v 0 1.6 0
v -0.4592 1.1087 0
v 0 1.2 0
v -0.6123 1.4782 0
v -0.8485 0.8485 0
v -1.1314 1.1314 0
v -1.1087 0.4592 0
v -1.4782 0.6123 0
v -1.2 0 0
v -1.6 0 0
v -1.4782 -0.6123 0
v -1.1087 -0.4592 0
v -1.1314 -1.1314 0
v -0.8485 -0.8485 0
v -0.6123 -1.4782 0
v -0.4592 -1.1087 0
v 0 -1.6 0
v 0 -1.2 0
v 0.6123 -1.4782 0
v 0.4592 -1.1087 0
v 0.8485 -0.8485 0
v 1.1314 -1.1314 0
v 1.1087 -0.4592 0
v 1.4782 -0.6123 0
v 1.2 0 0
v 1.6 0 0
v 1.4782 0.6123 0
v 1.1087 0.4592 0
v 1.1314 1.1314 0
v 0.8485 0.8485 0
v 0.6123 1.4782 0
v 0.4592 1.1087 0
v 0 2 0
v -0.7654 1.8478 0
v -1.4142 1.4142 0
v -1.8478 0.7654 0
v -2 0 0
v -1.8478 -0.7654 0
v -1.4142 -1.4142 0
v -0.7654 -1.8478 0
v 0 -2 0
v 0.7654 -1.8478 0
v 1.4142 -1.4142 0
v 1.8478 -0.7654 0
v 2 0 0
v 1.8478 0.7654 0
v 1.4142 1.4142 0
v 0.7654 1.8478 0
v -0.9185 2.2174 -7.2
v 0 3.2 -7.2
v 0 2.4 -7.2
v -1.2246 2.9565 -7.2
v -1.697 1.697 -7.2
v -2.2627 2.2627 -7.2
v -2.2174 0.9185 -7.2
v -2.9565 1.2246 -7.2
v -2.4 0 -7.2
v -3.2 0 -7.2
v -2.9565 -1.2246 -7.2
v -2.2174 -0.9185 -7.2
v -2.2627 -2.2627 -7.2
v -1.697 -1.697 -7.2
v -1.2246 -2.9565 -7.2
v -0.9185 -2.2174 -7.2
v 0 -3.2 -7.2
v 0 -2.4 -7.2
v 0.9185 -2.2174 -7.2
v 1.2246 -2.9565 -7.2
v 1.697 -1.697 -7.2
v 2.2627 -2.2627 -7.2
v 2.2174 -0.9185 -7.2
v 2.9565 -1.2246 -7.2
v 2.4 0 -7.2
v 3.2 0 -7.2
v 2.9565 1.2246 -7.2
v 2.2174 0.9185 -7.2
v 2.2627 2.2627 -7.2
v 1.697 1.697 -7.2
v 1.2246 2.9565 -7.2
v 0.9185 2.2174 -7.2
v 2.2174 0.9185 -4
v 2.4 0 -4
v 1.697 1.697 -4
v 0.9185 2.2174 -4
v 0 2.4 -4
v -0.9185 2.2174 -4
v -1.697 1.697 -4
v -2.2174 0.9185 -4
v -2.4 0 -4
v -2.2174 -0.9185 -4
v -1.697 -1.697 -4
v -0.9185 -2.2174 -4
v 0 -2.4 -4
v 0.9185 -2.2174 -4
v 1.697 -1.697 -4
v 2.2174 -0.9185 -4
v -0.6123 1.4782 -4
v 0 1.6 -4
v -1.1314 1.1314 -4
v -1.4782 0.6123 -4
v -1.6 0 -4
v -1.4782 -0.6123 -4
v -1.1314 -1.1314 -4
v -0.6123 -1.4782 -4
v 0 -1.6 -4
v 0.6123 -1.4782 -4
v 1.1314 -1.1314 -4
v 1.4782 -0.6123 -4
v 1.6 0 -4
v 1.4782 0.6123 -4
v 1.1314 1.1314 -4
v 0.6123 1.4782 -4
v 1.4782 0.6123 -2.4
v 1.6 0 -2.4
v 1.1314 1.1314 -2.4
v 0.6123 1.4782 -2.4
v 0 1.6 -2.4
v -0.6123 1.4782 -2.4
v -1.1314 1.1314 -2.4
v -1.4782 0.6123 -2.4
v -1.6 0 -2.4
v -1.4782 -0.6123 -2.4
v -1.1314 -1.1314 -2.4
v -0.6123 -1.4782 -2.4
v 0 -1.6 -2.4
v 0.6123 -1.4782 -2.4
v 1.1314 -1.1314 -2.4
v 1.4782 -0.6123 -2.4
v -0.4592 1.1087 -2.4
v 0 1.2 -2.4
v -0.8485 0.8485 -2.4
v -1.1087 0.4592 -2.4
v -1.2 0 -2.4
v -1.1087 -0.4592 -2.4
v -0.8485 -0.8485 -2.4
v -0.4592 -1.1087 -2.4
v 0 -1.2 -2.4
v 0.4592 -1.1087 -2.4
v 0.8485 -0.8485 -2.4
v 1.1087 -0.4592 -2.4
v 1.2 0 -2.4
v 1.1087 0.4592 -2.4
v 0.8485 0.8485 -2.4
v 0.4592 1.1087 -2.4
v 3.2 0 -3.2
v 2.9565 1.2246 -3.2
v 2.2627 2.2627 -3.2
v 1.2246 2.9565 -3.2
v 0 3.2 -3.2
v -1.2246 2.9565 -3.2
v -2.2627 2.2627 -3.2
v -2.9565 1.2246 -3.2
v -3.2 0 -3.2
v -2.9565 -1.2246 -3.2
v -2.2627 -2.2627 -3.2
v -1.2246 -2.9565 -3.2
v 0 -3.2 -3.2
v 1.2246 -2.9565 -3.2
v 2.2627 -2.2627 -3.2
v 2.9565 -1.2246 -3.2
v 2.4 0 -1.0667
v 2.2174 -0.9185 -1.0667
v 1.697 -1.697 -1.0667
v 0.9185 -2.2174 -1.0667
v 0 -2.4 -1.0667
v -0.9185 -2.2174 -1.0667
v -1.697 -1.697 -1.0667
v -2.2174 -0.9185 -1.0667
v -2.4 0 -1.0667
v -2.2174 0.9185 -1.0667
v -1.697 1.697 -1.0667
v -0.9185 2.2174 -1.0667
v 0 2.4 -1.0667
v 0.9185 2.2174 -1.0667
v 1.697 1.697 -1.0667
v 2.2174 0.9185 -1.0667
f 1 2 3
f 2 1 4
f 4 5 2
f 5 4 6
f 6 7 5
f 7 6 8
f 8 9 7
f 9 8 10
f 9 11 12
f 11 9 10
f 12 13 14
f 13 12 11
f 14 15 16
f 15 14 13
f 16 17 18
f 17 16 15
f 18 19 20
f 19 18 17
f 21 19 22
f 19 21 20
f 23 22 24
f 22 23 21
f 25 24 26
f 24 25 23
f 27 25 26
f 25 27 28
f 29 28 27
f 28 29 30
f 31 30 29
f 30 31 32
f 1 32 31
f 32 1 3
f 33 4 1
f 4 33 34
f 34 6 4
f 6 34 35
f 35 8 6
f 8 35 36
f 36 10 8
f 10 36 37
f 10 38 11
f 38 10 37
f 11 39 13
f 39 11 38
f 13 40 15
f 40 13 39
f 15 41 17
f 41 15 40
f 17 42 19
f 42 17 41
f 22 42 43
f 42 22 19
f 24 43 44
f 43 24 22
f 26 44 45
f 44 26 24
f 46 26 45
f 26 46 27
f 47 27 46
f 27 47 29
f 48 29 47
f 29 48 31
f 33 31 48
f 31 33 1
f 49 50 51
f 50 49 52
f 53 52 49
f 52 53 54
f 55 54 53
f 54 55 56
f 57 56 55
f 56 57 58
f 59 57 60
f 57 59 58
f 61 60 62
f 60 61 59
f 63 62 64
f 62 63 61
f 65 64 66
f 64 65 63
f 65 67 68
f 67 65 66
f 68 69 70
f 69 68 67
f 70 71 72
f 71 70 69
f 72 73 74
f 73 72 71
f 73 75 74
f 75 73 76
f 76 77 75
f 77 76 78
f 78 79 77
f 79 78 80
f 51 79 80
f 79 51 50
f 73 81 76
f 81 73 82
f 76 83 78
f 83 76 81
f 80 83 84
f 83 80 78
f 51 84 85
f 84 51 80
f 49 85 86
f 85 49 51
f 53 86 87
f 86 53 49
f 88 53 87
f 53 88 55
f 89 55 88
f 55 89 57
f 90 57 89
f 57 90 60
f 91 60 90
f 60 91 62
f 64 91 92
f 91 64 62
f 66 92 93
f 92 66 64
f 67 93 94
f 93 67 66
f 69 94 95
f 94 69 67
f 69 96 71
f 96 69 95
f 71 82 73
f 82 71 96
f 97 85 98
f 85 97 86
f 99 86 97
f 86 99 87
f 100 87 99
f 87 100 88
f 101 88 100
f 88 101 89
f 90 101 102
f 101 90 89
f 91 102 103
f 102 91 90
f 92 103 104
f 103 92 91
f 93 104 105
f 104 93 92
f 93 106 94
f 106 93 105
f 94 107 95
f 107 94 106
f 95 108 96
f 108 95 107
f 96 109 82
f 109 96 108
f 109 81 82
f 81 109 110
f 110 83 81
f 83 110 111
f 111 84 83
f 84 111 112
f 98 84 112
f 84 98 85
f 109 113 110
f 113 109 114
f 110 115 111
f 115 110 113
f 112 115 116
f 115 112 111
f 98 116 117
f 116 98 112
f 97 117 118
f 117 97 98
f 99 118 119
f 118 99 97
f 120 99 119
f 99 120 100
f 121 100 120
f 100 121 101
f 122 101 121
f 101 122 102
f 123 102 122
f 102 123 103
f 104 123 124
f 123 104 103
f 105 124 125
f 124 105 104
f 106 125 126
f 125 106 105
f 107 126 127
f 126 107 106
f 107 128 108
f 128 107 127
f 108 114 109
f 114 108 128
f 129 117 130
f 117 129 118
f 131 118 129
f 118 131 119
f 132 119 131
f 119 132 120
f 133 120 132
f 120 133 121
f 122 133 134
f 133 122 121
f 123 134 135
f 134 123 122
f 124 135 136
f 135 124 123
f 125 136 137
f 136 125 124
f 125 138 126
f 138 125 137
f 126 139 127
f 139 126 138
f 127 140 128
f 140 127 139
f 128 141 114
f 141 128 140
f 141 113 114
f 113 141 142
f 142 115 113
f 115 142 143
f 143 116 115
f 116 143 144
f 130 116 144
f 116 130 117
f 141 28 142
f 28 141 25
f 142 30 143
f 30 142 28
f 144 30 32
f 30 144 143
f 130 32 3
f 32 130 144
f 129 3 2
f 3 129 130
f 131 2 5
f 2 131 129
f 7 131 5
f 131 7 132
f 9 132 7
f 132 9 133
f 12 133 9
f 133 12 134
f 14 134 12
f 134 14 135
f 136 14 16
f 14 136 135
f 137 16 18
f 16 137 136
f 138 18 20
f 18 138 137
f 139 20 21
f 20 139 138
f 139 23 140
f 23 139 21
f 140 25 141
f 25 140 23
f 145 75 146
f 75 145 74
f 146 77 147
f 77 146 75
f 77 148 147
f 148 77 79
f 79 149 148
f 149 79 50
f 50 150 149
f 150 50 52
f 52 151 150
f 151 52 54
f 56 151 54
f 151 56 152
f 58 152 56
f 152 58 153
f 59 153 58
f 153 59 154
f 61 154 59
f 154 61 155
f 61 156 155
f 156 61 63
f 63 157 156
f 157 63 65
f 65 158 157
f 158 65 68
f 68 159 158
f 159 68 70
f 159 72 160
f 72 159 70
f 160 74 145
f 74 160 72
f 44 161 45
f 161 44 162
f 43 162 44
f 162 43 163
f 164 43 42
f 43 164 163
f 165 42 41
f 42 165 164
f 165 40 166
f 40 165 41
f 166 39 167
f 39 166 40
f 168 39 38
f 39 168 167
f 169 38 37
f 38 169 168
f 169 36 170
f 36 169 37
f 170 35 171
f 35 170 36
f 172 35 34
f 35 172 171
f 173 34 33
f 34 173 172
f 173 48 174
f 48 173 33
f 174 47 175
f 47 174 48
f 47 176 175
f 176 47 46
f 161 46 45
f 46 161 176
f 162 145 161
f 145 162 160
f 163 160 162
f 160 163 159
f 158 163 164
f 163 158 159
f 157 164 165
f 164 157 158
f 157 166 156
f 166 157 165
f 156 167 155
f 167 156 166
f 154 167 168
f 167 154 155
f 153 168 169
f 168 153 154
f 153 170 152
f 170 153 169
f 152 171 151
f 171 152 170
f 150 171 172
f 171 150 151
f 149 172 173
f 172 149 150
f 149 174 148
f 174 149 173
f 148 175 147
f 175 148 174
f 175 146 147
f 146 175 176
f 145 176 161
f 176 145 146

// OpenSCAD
// file: ../p/4-4cyli.scad
use <../lib.scad>
function ldraw_lib__4_4cyli() = [
// 0 Cylinder 1.0
// 0 Name: 4-4cyli.dat
// 0 Author: James Jessiman
// 0 !LDRAW_ORG Primitive UPDATE 2005-01
// 0 !LICENSE Licensed under CC BY 2.0 and CC BY 4.0 : see CAreadme.txt
// 
// 0 BFC CERTIFY CCW
  [0,"BFC","CERTIFY"],
  [0,"BFC","CCW"],
// 
// 0 !HISTORY 1998-12-15 [PTadmin] Official Update 1998-10
// 0 !HISTORY 2002-03-23 [sbliss] Added BFC statement; merged headers from files in distributions LDraw 0.27 and Complete.
// 0 !HISTORY 2002-04-25 [PTadmin] Official Update 2002-02
// 0 !HISTORY 2004-12-14 [guyvivan] BFC CCW
// 0 !HISTORY 2005-12-28 [PTadmin] Official Update 2005-01
// 0 !HISTORY 2007-06-24 [PTadmin] Header formatted for Contributor Agreement
// 0 !HISTORY 2008-07-01 [PTadmin] Official Update 2008-01
// 
// 
// 4 16 1 1 0 0.9239 1 0.3827 0.9239 0 0.3827 1 0 0
  [4,16,1,1,0,0.9239,1,0.3827,0.9239,0,0.3827,1,0,0],
// 5 24 1 0 0 1 1 0 0.9239 0 0.3827 0.9239 0 -0.3827
  [5,24,1,0,0,1,1,0,0.9239,0,0.3827,0.9239,0,-0.3827],
// 4 16 0.9239 1 0.3827 0.7071 1 0.7071 0.7071 0 0.7071 0.9239 0 0.3827
  [4,16,0.9239,1,0.3827,0.7071,1,0.7071,0.7071,0,0.7071,0.9239,0,0.3827],
// 5 24 0.9239 0 0.3827 0.9239 1 0.3827 0.7071 0 0.7071 1 0 0
  [5,24,0.9239,0,0.3827,0.9239,1,0.3827,0.7071,0,0.7071,1,0,0],
// 4 16 0.7071 1 0.7071 0.3827 1 0.9239 0.3827 0 0.9239 0.7071 0 0.7071
  [4,16,0.7071,1,0.7071,0.3827,1,0.9239,0.3827,0,0.9239,0.7071,0,0.7071],
// 5 24 0.7071 0 0.7071 0.7071 1 0.7071 0.3827 0 0.9239 0.9239 0 0.3827
  [5,24,0.7071,0,0.7071,0.7071,1,0.7071,0.3827,0,0.9239,0.9239,0,0.3827],
// 4 16 0.3827 1 0.9239 0 1 1 0 0 1 0.3827 0 0.9239
  [4,16,0.3827,1,0.9239,0,1,1,0,0,1,0.3827,0,0.9239],
// 5 24 0.3827 0 0.9239 0.3827 1 0.9239 0 0 1 0.7071 0 0.7071
  [5,24,0.3827,0,0.9239,0.3827,1,0.9239,0,0,1,0.7071,0,0.7071],
// 4 16 0 1 1 -0.3827 1 0.9239 -0.3827 0 0.9239 0 0 1
  [4,16,0,1,1,-0.3827,1,0.9239,-0.3827,0,0.9239,0,0,1],
// 5 24 0 0 1 0 1 1 -0.3827 0 0.9239 0.3827 0 0.9239
  [5,24,0,0,1,0,1,1,-0.3827,0,0.9239,0.3827,0,0.9239],
// 4 16 -0.3827 1 0.9239 -0.7071 1 0.7071 -0.7071 0 0.7071 -0.3827 0 0.9239
  [4,16,-0.3827,1,0.9239,-0.7071,1,0.7071,-0.7071,0,0.7071,-0.3827,0,0.9239],
// 5 24 -0.3827 0 0.9239 -0.3827 1 0.9239 -0.7071 0 0.7071 0 0 1
  [5,24,-0.3827,0,0.9239,-0.3827,1,0.9239,-0.7071,0,0.7071,0,0,1],
// 4 16 -0.7071 1 0.7071 -0.9239 1 0.3827 -0.9239 0 0.3827 -0.7071 0 0.7071
  [4,16,-0.7071,1,0.7071,-0.9239,1,0.3827,-0.9239,0,0.3827,-0.7071,0,0.7071],
// 5 24 -0.7071 0 0.7071 -0.7071 1 0.7071 -0.9239 0 0.3827 -0.3827 0 0.9239
  [5,24,-0.7071,0,0.7071,-0.7071,1,0.7071,-0.9239,0,0.3827,-0.3827,0,0.9239],
// 4 16 -0.9239 1 0.3827 -1 1 0 -1 0 0 -0.9239 0 0.3827
  [4,16,-0.9239,1,0.3827,-1,1,0,-1,0,0,-0.9239,0,0.3827],
// 5 24 -0.9239 0 0.3827 -0.9239 1 0.3827 -1 0 0 -0.7071 0 0.7071
  [5,24,-0.9239,0,0.3827,-0.9239,1,0.3827,-1,0,0,-0.7071,0,0.7071],
// 4 16 -1 1 0 -0.9239 1 -0.3827 -0.9239 0 -0.3827 -1 0 0
  [4,16,-1,1,0,-0.9239,1,-0.3827,-0.9239,0,-0.3827,-1,0,0],
// 5 24 -1 0 0 -1 1 0 -0.9239 0 -0.3827 -0.9239 0 0.3827
  [5,24,-1,0,0,-1,1,0,-0.9239,0,-0.3827,-0.9239,0,0.3827],
// 4 16 -0.9239 1 -0.3827 -0.7071 1 -0.7071 -0.7071 0 -0.7071 -0.9239 0 -0.3827
  [4,16,-0.9239,1,-0.3827,-0.7071,1,-0.7071,-0.7071,0,-0.7071,-0.9239,0,-0.3827],
// 5 24 -0.9239 0 -0.3827 -0.9239 1 -0.3827 -0.7071 0 -0.7071 -1 0 0
  [5,24,-0.9239,0,-0.3827,-0.9239,1,-0.3827,-0.7071,0,-0.7071,-1,0,0],
// 4 16 -0.7071 1 -0.7071 -0.3827 1 -0.9239 -0.3827 0 -0.9239 -0.7071 0 -0.7071
  [4,16,-0.7071,1,-0.7071,-0.3827,1,-0.9239,-0.3827,0,-0.9239,-0.7071,0,-0.7071],
// 5 24 -0.7071 0 -0.7071 -0.7071 1 -0.7071 -0.3827 0 -0.9239 -0.9239 0 -0.3827
  [5,24,-0.7071,0,-0.7071,-0.7071,1,-0.7071,-0.3827,0,-0.9239,-0.9239,0,-0.3827],
// 4 16 -0.3827 1 -0.9239 0 1 -1 0 0 -1 -0.3827 0 -0.9239
  [4,16,-0.3827,1,-0.9239,0,1,-1,0,0,-1,-0.3827,0,-0.9239],
// 5 24 -0.3827 0 -0.9239 -0.3827 1 -0.9239 0 0 -1 -0.7071 0 -0.7071
  [5,24,-0.3827,0,-0.9239,-0.3827,1,-0.9239,0,0,-1,-0.7071,0,-0.7071],
// 4 16 0 1 -1 0.3827 1 -0.9239 0.3827 0 -0.9239 0 0 -1
  [4,16,0,1,-1,0.3827,1,-0.9239,0.3827,0,-0.9239,0,0,-1],
// 5 24 0 0 -1 0 1 -1 0.3827 0 -0.9239 -0.3827 0 -0.9239
  [5,24,0,0,-1,0,1,-1,0.3827,0,-0.9239,-0.3827,0,-0.9239],
// 4 16 0.3827 1 -0.9239 0.7071 1 -0.7071 0.7071 0 -0.7071 0.3827 0 -0.9239
  [4,16,0.3827,1,-0.9239,0.7071,1,-0.7071,0.7071,0,-0.7071,0.3827,0,-0.9239],
// 5 24 0.3827 0 -0.9239 0.3827 1 -0.9239 0.7071 0 -0.7071 0 0 -1
  [5,24,0.3827,0,-0.9239,0.3827,1,-0.9239,0.7071,0,-0.7071,0,0,-1],
// 4 16 0.7071 1 -0.7071 0.9239 1 -0.3827 0.9239 0 -0.3827 0.7071 0 -0.7071
  [4,16,0.7071,1,-0.7071,0.9239,1,-0.3827,0.9239,0,-0.3827,0.7071,0,-0.7071],
// 5 24 0.7071 0 -0.7071 0.7071 1 -0.7071 0.9239 0 -0.3827 0.3827 0 -0.9239
  [5,24,0.7071,0,-0.7071,0.7071,1,-0.7071,0.9239,0,-0.3827,0.3827,0,-0.9239],
// 4 16 0.9239 1 -0.3827 1 1 0 1 0 0 0.9239 0 -0.3827
  [4,16,0.9239,1,-0.3827,1,1,0,1,0,0,0.9239,0,-0.3827],
// 5 24 0.9239 0 -0.3827 0.9239 1 -0.3827 1 0 0 0.7071 0 -0.7071
  [5,24,0.9239,0,-0.3827,0.9239,1,-0.3827,1,0,0,0.7071,0,-0.7071],
// 0
];
makepoly(ldraw_lib__4_4cyli(), line=0.2);
// file: ../p/4-4ring4.scad
use <../lib.scad>
function ldraw_lib__4_4ring4() = [
// 0 Ring  4 x 1.0
// 0 Name: 4-4ring4.dat
// 0 Author: James Jessiman
// 0 !LDRAW_ORG Primitive UPDATE 2009-01
// 0 !LICENSE Licensed under CC BY 2.0 and CC BY 4.0 : see CAreadme.txt
// 
// 0 BFC CERTIFY CCW
  [0,"BFC","CERTIFY"],
  [0,"BFC","CCW"],
// 
// 0 !HISTORY 1998-12-15 [PTadmin] Official Update 1998-10
// 0 !HISTORY 2002-04-08 [BrickCaster] Modified for BFC compliance
// 0 !HISTORY 2002-04-25 [PTadmin] Official Update 2002-02
// 0 !HISTORY 2007-06-24 [PTadmin] Header formatted for Contributor Agreement
// 0 !HISTORY 2008-07-01 [PTadmin] Official Update 2008-01
// 0 !HISTORY 2008-08-26 [cwdee] Switch polygon winding and rename
// 0 !HISTORY 2009-05-02 [PTadmin] Official Update 2009-01
// 
// 
// 4 16 -1.9135 0 4.6195 -1.5308 0 3.6956 0 0 4 0 0 5
  [4,16,-1.9135,0,4.6195,-1.5308,0,3.6956,0,0,4,0,0,5],
// 4 16 -3.5355 0 3.5355 -2.8284 0 2.8284 -1.5308 0 3.6956 -1.9135 0 4.6195
  [4,16,-3.5355,0,3.5355,-2.8284,0,2.8284,-1.5308,0,3.6956,-1.9135,0,4.6195],
// 4 16 -4.6195 0 1.9135 -3.6956 0 1.5308 -2.8284 0 2.8284 -3.5355 0 3.5355
  [4,16,-4.6195,0,1.9135,-3.6956,0,1.5308,-2.8284,0,2.8284,-3.5355,0,3.5355],
// 4 16 -5 0 0 -4 0 0 -3.6956 0 1.5308 -4.6195 0 1.9135
  [4,16,-5,0,0,-4,0,0,-3.6956,0,1.5308,-4.6195,0,1.9135],
// 4 16 -4.6195 0 -1.9135 -3.6956 0 -1.5308 -4 0 0 -5 0 0
  [4,16,-4.6195,0,-1.9135,-3.6956,0,-1.5308,-4,0,0,-5,0,0],
// 4 16 -3.5355 0 -3.5355 -2.8284 0 -2.8284 -3.6956 0 -1.5308 -4.6195 0 -1.9135
  [4,16,-3.5355,0,-3.5355,-2.8284,0,-2.8284,-3.6956,0,-1.5308,-4.6195,0,-1.9135],
// 4 16 -1.9135 0 -4.6195 -1.5308 0 -3.6956 -2.8284 0 -2.8284 -3.5355 0 -3.5355
  [4,16,-1.9135,0,-4.6195,-1.5308,0,-3.6956,-2.8284,0,-2.8284,-3.5355,0,-3.5355],
// 4 16 0 0 -5 0 0 -4 -1.5308 0 -3.6956 -1.9135 0 -4.6195
  [4,16,0,0,-5,0,0,-4,-1.5308,0,-3.6956,-1.9135,0,-4.6195],
// 4 16 1.9135 0 -4.6195 1.5308 0 -3.6956 0 0 -4 0 0 -5
  [4,16,1.9135,0,-4.6195,1.5308,0,-3.6956,0,0,-4,0,0,-5],
// 4 16 3.5355 0 -3.5355 2.8284 0 -2.8284 1.5308 0 -3.6956 1.9135 0 -4.6195
  [4,16,3.5355,0,-3.5355,2.8284,0,-2.8284,1.5308,0,-3.6956,1.9135,0,-4.6195],
// 4 16 4.6195 0 -1.9135 3.6956 0 -1.5308 2.8284 0 -2.8284 3.5355 0 -3.5355
  [4,16,4.6195,0,-1.9135,3.6956,0,-1.5308,2.8284,0,-2.8284,3.5355,0,-3.5355],
// 4 16 5 0 0 4 0 0 3.6956 0 -1.5308 4.6195 0 -1.9135
  [4,16,5,0,0,4,0,0,3.6956,0,-1.5308,4.6195,0,-1.9135],
// 4 16 4.6195 0 1.9135 3.6956 0 1.5308 4 0 0 5 0 0
  [4,16,4.6195,0,1.9135,3.6956,0,1.5308,4,0,0,5,0,0],
// 4 16 3.5355 0 3.5355 2.8284 0 2.8284 3.6956 0 1.5308 4.6195 0 1.9135
  [4,16,3.5355,0,3.5355,2.8284,0,2.8284,3.6956,0,1.5308,4.6195,0,1.9135],
// 4 16 1.9135 0 4.6195 1.5308 0 3.6956 2.8284 0 2.8284 3.5355 0 3.5355
  [4,16,1.9135,0,4.6195,1.5308,0,3.6956,2.8284,0,2.8284,3.5355,0,3.5355],
// 4 16 0 0 5 0 0 4 1.5308 0 3.6956 1.9135 0 4.6195
  [4,16,0,0,5,0,0,4,1.5308,0,3.6956,1.9135,0,4.6195],
// 0
];
makepoly(ldraw_lib__4_4ring4(), line=0.2);
// file: ../p/4-4ring3.scad
use <../lib.scad>
function ldraw_lib__4_4ring3() = [
// 0 Ring  3 x 1.0
// 0 Name: 4-4ring3.dat
// 0 Author: James Jessiman
// 0 !LDRAW_ORG Primitive UPDATE 2009-01
// 0 !LICENSE Licensed under CC BY 2.0 and CC BY 4.0 : see CAreadme.txt
// 
// 0 BFC CERTIFY CCW
  [0,"BFC","CERTIFY"],
  [0,"BFC","CCW"],
// 
// 0 !HISTORY 1998-12-15 [PTadmin] Official Update 1998-10
// 0 !HISTORY 2002-04-05 [hafhead] Added BFC statement
// 0 !HISTORY 2002-04-25 [PTadmin] Official Update 2002-02
// 0 !HISTORY 2007-06-24 [PTadmin] Header formatted for Contributor Agreement
// 0 !HISTORY 2008-07-01 [PTadmin] Official Update 2008-01
// 0 !HISTORY 2008-08-26 [cwdee] Switch polygon winding and rename
// 0 !HISTORY 2009-05-02 [PTadmin] Official Update 2009-01
// 
// 
// 4 16 -1.5308 0 3.6956 -1.1481 0 2.7717 0 0 3 0 0 4
  [4,16,-1.5308,0,3.6956,-1.1481,0,2.7717,0,0,3,0,0,4],
// 4 16 -2.8284 0 2.8284 -2.1213 0 2.1213 -1.1481 0 2.7717 -1.5308 0 3.6956
  [4,16,-2.8284,0,2.8284,-2.1213,0,2.1213,-1.1481,0,2.7717,-1.5308,0,3.6956],
// 4 16 -3.6956 0 1.5308 -2.7717 0 1.1481 -2.1213 0 2.1213 -2.8284 0 2.8284
  [4,16,-3.6956,0,1.5308,-2.7717,0,1.1481,-2.1213,0,2.1213,-2.8284,0,2.8284],
// 4 16 -4 0 0 -3 0 0 -2.7717 0 1.1481 -3.6956 0 1.5308
  [4,16,-4,0,0,-3,0,0,-2.7717,0,1.1481,-3.6956,0,1.5308],
// 4 16 -3.6956 0 -1.5308 -2.7717 0 -1.1481 -3 0 0 -4 0 0
  [4,16,-3.6956,0,-1.5308,-2.7717,0,-1.1481,-3,0,0,-4,0,0],
// 4 16 -2.8284 0 -2.8284 -2.1213 0 -2.1213 -2.7717 0 -1.1481 -3.6956 0 -1.5308
  [4,16,-2.8284,0,-2.8284,-2.1213,0,-2.1213,-2.7717,0,-1.1481,-3.6956,0,-1.5308],
// 4 16 -1.5308 0 -3.6956 -1.1481 0 -2.7717 -2.1213 0 -2.1213 -2.8284 0 -2.8284
  [4,16,-1.5308,0,-3.6956,-1.1481,0,-2.7717,-2.1213,0,-2.1213,-2.8284,0,-2.8284],
// 4 16 0 0 -4 0 0 -3 -1.1481 0 -2.7717 -1.5308 0 -3.6956
  [4,16,0,0,-4,0,0,-3,-1.1481,0,-2.7717,-1.5308,0,-3.6956],
// 4 16 1.5308 0 -3.6956 1.1481 0 -2.7717 0 0 -3 0 0 -4
  [4,16,1.5308,0,-3.6956,1.1481,0,-2.7717,0,0,-3,0,0,-4],
// 4 16 2.8284 0 -2.8284 2.1213 0 -2.1213 1.1481 0 -2.7717 1.5308 0 -3.6956
  [4,16,2.8284,0,-2.8284,2.1213,0,-2.1213,1.1481,0,-2.7717,1.5308,0,-3.6956],
// 4 16 3.6956 0 -1.5308 2.7717 0 -1.1481 2.1213 0 -2.1213 2.8284 0 -2.8284
  [4,16,3.6956,0,-1.5308,2.7717,0,-1.1481,2.1213,0,-2.1213,2.8284,0,-2.8284],
// 4 16 4 0 0 3 0 0 2.7717 0 -1.1481 3.6956 0 -1.5308
  [4,16,4,0,0,3,0,0,2.7717,0,-1.1481,3.6956,0,-1.5308],
// 4 16 3.6956 0 1.5308 2.7717 0 1.1481 3 0 0 4 0 0
  [4,16,3.6956,0,1.5308,2.7717,0,1.1481,3,0,0,4,0,0],
// 4 16 2.8284 0 2.8284 2.1213 0 2.1213 2.7717 0 1.1481 3.6956 0 1.5308
  [4,16,2.8284,0,2.8284,2.1213,0,2.1213,2.7717,0,1.1481,3.6956,0,1.5308],
// 4 16 1.5308 0 3.6956 1.1481 0 2.7717 2.1213 0 2.1213 2.8284 0 2.8284
  [4,16,1.5308,0,3.6956,1.1481,0,2.7717,2.1213,0,2.1213,2.8284,0,2.8284],
// 4 16 0 0 4 0 0 3 1.1481 0 2.7717 1.5308 0 3.6956
  [4,16,0,0,4,0,0,3,1.1481,0,2.7717,1.5308,0,3.6956],
// 0
];
makepoly(ldraw_lib__4_4ring3(), line=0.2);
// file: ../p/4-4ring2.scad
use <../lib.scad>
function ldraw_lib__4_4ring2() = [
// 0 Ring  2 x 1.0
// 0 Name: 4-4ring2.dat
// 0 Author: James Jessiman
// 0 !LDRAW_ORG Primitive UPDATE 2009-01
// 0 !LICENSE Licensed under CC BY 2.0 and CC BY 4.0 : see CAreadme.txt
// 
// 0 BFC CERTIFY CCW
  [0,"BFC","CERTIFY"],
  [0,"BFC","CCW"],
// 
// 0 !HISTORY 1998-12-15 [PTadmin] Official Update 1998-10
// 0 !HISTORY 2002-04-05 [hafhead] Added BFC statement
// 0 !HISTORY 2002-04-25 [PTadmin] Official Update 2002-02
// 0 !HISTORY 2007-06-24 [PTadmin] Header formatted for Contributor Agreement
// 0 !HISTORY 2008-07-01 [PTadmin] Official Update 2008-01
// 0 !HISTORY 2008-08-26 [cwdee] Switch polygon winding and rename
// 0 !HISTORY 2009-05-02 [PTadmin] Official Update 2009-01
// 
// 
// 4 16 -1.1481 0 2.7717 -0.7654 0 1.8478 0 0 2 0 0 3
  [4,16,-1.1481,0,2.7717,-0.7654,0,1.8478,0,0,2,0,0,3],
// 4 16 -2.1213 0 2.1213 -1.4142 0 1.4142 -0.7654 0 1.8478 -1.1481 0 2.7717
  [4,16,-2.1213,0,2.1213,-1.4142,0,1.4142,-0.7654,0,1.8478,-1.1481,0,2.7717],
// 4 16 -2.7717 0 1.1481 -1.8478 0 0.7654 -1.4142 0 1.4142 -2.1213 0 2.1213
  [4,16,-2.7717,0,1.1481,-1.8478,0,0.7654,-1.4142,0,1.4142,-2.1213,0,2.1213],
// 4 16 -3 0 0 -2 0 0 -1.8478 0 0.7654 -2.7717 0 1.1481
  [4,16,-3,0,0,-2,0,0,-1.8478,0,0.7654,-2.7717,0,1.1481],
// 4 16 -2.7717 0 -1.1481 -1.8478 0 -0.7654 -2 0 0 -3 0 0
  [4,16,-2.7717,0,-1.1481,-1.8478,0,-0.7654,-2,0,0,-3,0,0],
// 4 16 -2.1213 0 -2.1213 -1.4142 0 -1.4142 -1.8478 0 -0.7654 -2.7717 0 -1.1481
  [4,16,-2.1213,0,-2.1213,-1.4142,0,-1.4142,-1.8478,0,-0.7654,-2.7717,0,-1.1481],
// 4 16 -1.1481 0 -2.7717 -0.7654 0 -1.8478 -1.4142 0 -1.4142 -2.1213 0 -2.1213
  [4,16,-1.1481,0,-2.7717,-0.7654,0,-1.8478,-1.4142,0,-1.4142,-2.1213,0,-2.1213],
// 4 16 0 0 -3 0 0 -2 -0.7654 0 -1.8478 -1.1481 0 -2.7717
  [4,16,0,0,-3,0,0,-2,-0.7654,0,-1.8478,-1.1481,0,-2.7717],
// 4 16 1.1481 0 -2.7717 0.7654 0 -1.8478 0 0 -2 0 0 -3
  [4,16,1.1481,0,-2.7717,0.7654,0,-1.8478,0,0,-2,0,0,-3],
// 4 16 2.1213 0 -2.1213 1.4142 0 -1.4142 0.7654 0 -1.8478 1.1481 0 -2.7717
  [4,16,2.1213,0,-2.1213,1.4142,0,-1.4142,0.7654,0,-1.8478,1.1481,0,-2.7717],
// 4 16 2.7717 0 -1.1481 1.8478 0 -0.7654 1.4142 0 -1.4142 2.1213 0 -2.1213
  [4,16,2.7717,0,-1.1481,1.8478,0,-0.7654,1.4142,0,-1.4142,2.1213,0,-2.1213],
// 4 16 3 0 0 2 0 0 1.8478 0 -0.7654 2.7717 0 -1.1481
  [4,16,3,0,0,2,0,0,1.8478,0,-0.7654,2.7717,0,-1.1481],
// 4 16 2.7717 0 1.1481 1.8478 0 0.7654 2 0 0 3 0 0
  [4,16,2.7717,0,1.1481,1.8478,0,0.7654,2,0,0,3,0,0],
// 4 16 2.1213 0 2.1213 1.4142 0 1.4142 1.8478 0 0.7654 2.7717 0 1.1481
  [4,16,2.1213,0,2.1213,1.4142,0,1.4142,1.8478,0,0.7654,2.7717,0,1.1481],
// 4 16 1.1481 0 2.7717 0.7654 0 1.8478 1.4142 0 1.4142 2.1213 0 2.1213
  [4,16,1.1481,0,2.7717,0.7654,0,1.8478,1.4142,0,1.4142,2.1213,0,2.1213],
// 4 16 0 0 3 0 0 2 0.7654 0 1.8478 1.1481 0 2.7717
  [4,16,0,0,3,0,0,2,0.7654,0,1.8478,1.1481,0,2.7717],
// 0
];
makepoly(ldraw_lib__4_4ring2(), line=0.2);
// file: ../p/4-4edge.scad
use <../lib.scad>
function ldraw_lib__4_4edge() = [
// 0 Circle 1.0
// 0 Name: 4-4edge.dat
// 0 Author: James Jessiman
// 0 !LDRAW_ORG Primitive UPDATE 2017-01
// 0 !LICENSE Licensed under CC BY 2.0 and CC BY 4.0 : see CAreadme.txt
// 
// 0 BFC CERTIFY CCW
  [0,"BFC","CERTIFY"],
  [0,"BFC","CCW"],
// 
// 0 !HISTORY 1998-12-15 [PTadmin] Official Update 1998-10
// 0 !HISTORY 2005-12-28 [PTadmin] Official Update 2005-01
// 0 !HISTORY 2007-06-24 [PTadmin] Header formatted for Contributor Agreement
// 0 !HISTORY 2008-07-01 [PTadmin] Official Update 2008-01
// 0 !HISTORY 2017-01-15 [Steffen] BFCed
// 0 !HISTORY 2017-12-30 [PTadmin] Official Update 2017-01
// 
// 
// 2 24 1 0 0 0.9239 0 0.3827
  [2,24,1,0,0,0.9239,0,0.3827],
// 2 24 0.9239 0 0.3827 0.7071 0 0.7071
  [2,24,0.9239,0,0.3827,0.7071,0,0.7071],
// 2 24 0.7071 0 0.7071 0.3827 0 0.9239
  [2,24,0.7071,0,0.7071,0.3827,0,0.9239],
// 2 24 0.3827 0 0.9239 0 0 1
  [2,24,0.3827,0,0.9239,0,0,1],
// 2 24 0 0 1 -0.3827 0 0.9239
  [2,24,0,0,1,-0.3827,0,0.9239],
// 2 24 -0.3827 0 0.9239 -0.7071 0 0.7071
  [2,24,-0.3827,0,0.9239,-0.7071,0,0.7071],
// 2 24 -0.7071 0 0.7071 -0.9239 0 0.3827
  [2,24,-0.7071,0,0.7071,-0.9239,0,0.3827],
// 2 24 -0.9239 0 0.3827 -1 0 -0
  [2,24,-0.9239,0,0.3827,-1,0,-0],
// 2 24 -1 0 -0 -0.9239 0 -0.3827
  [2,24,-1,0,-0,-0.9239,0,-0.3827],
// 2 24 -0.9239 0 -0.3827 -0.7071 0 -0.7071
  [2,24,-0.9239,0,-0.3827,-0.7071,0,-0.7071],
// 2 24 -0.7071 0 -0.7071 -0.3827 0 -0.9239
  [2,24,-0.7071,0,-0.7071,-0.3827,0,-0.9239],
// 2 24 -0.3827 0 -0.9239 0 0 -1
  [2,24,-0.3827,0,-0.9239,0,0,-1],
// 2 24 0 0 -1 0.3827 0 -0.9239
  [2,24,0,0,-1,0.3827,0,-0.9239],
// 2 24 0.3827 0 -0.9239 0.7071 0 -0.7071
  [2,24,0.3827,0,-0.9239,0.7071,0,-0.7071],
// 2 24 0.7071 0 -0.7071 0.9239 0 -0.3827
  [2,24,0.7071,0,-0.7071,0.9239,0,-0.3827],
// 2 24 0.9239 0 -0.3827 1 0 0
  [2,24,0.9239,0,-0.3827,1,0,0],
];
makepoly(ldraw_lib__4_4edge(), line=0.2);
// file: ../p/4-4cylo.scad
use <../lib.scad>
use <4-4cyli.scad>
use <4-4edge.scad>
function ldraw_lib__4_4cylo() = [
// 0 Cylinder Open 1.0
// 0 Name: 4-4cylo.dat
// 0 Author: Mark Kennedy [mkennedy]
// 0 !LDRAW_ORG Primitive UPDATE 2010-01
// 0 !LICENSE Licensed under CC BY 2.0 and CC BY 4.0 : see CAreadme.txt
// 
// 0 BFC CERTIFY CCW
  [0,"BFC","CERTIFY"],
  [0,"BFC","CCW"],
// 
// 0 !HISTORY 2010-04-05 [PTadmin] Official Update 2010-01
// 
// 
// 1 16 0 0 0 1 0 0 0 1 0 0 0 1 4-4edge.dat
  [1,16,0,0,0,1,0,0,0,1,0,0,0,1, ldraw_lib__4_4edge()],
// 1 16 0 1 0 1 0 0 0 1 0 0 0 1 4-4edge.dat
  [1,16,0,1,0,1,0,0,0,1,0,0,0,1, ldraw_lib__4_4edge()],
// 1 16 0 0 0 1 0 0 0 1 0 0 0 1 4-4cyli.dat
  [1,16,0,0,0,1,0,0,0,1,0,0,0,1, ldraw_lib__4_4cyli()],
// 0
];
makepoly(ldraw_lib__4_4cylo(), line=0.2);
// file: ../p/4-4con5.scad
use <../lib.scad>
function ldraw_lib__4_4con5() = [
// 0 Cone  5 x 1.0
// 0 Name: 4-4con5.dat
// 0 Author: Niels Karsdorp [nielsk]
// 0 !LDRAW_ORG Primitive UPDATE 2003-03
// 0 !LICENSE Licensed under CC BY 2.0 and CC BY 4.0 : see CAreadme.txt
// 
// 0 BFC CERTIFY CCW
  [0,"BFC","CERTIFY"],
  [0,"BFC","CCW"],
// 
// 0 !HISTORY 2003-12-19 [PTadmin] Official Update 2003-03
// 0 !HISTORY 2007-06-24 [PTadmin] Header formatted for Contributor Agreement
// 0 !HISTORY 2008-07-01 [PTadmin] Official Update 2008-01
// 
// 
// 5 24 5 1 0 6 0 0 4.6195 1 1.9135 4.6195 1 -1.9135
  [5,24,5,1,0,6,0,0,4.6195,1,1.9135,4.6195,1,-1.9135],
// 5 24 4.6195 1 1.9135 5.5434 0 2.2962 3.5355 1 3.5355 5 1 0
  [5,24,4.6195,1,1.9135,5.5434,0,2.2962,3.5355,1,3.5355,5,1,0],
// 5 24 3.5355 1 3.5355 4.2426 0 4.2426 1.9135 1 4.6195 4.6195 1 1.9135
  [5,24,3.5355,1,3.5355,4.2426,0,4.2426,1.9135,1,4.6195,4.6195,1,1.9135],
// 5 24 1.9135 1 4.6195 2.2962 0 5.5434 0 1 5 3.5355 1 3.5355
  [5,24,1.9135,1,4.6195,2.2962,0,5.5434,0,1,5,3.5355,1,3.5355],
// 5 24 0 1 5 0 0 6 -1.9135 1 4.6195 1.9135 1 4.6195
  [5,24,0,1,5,0,0,6,-1.9135,1,4.6195,1.9135,1,4.6195],
// 5 24 -1.9135 1 4.6195 -2.2962 0 5.5434 -3.5355 1 3.5355 0 1 5
  [5,24,-1.9135,1,4.6195,-2.2962,0,5.5434,-3.5355,1,3.5355,0,1,5],
// 5 24 -3.5355 1 3.5355 -4.2426 0 4.2426 -4.6195 1 1.9135 -1.9135 1 4.6195
  [5,24,-3.5355,1,3.5355,-4.2426,0,4.2426,-4.6195,1,1.9135,-1.9135,1,4.6195],
// 5 24 -4.6195 1 1.9135 -5.5434 0 2.2962 -5 1 0 -3.5355 1 3.5355
  [5,24,-4.6195,1,1.9135,-5.5434,0,2.2962,-5,1,0,-3.5355,1,3.5355],
// 5 24 -5 1 0 -6 0 0 -4.6195 1 -1.9135 -4.6195 1 1.9135
  [5,24,-5,1,0,-6,0,0,-4.6195,1,-1.9135,-4.6195,1,1.9135],
// 5 24 -4.6195 1 -1.9135 -5.5434 0 -2.2962 -3.5355 1 -3.5355 -5 1 0
  [5,24,-4.6195,1,-1.9135,-5.5434,0,-2.2962,-3.5355,1,-3.5355,-5,1,0],
// 5 24 -3.5355 1 -3.5355 -4.2426 0 -4.2426 -1.9135 1 -4.6195 -4.6195 1 -1.9135
  [5,24,-3.5355,1,-3.5355,-4.2426,0,-4.2426,-1.9135,1,-4.6195,-4.6195,1,-1.9135],
// 5 24 -1.9135 1 -4.6195 -2.2962 0 -5.5434 0 1 -5 -3.5355 1 -3.5355
  [5,24,-1.9135,1,-4.6195,-2.2962,0,-5.5434,0,1,-5,-3.5355,1,-3.5355],
// 5 24 0 1 -5 0 0 -6 1.9135 1 -4.6195 -1.9135 1 -4.6195
  [5,24,0,1,-5,0,0,-6,1.9135,1,-4.6195,-1.9135,1,-4.6195],
// 5 24 1.9135 1 -4.6195 2.2962 0 -5.5434 3.5355 1 -3.5355 0 1 -5
  [5,24,1.9135,1,-4.6195,2.2962,0,-5.5434,3.5355,1,-3.5355,0,1,-5],
// 5 24 3.5355 1 -3.5355 4.2426 0 -4.2426 4.6195 1 -1.9135 1.9135 1 -4.6195
  [5,24,3.5355,1,-3.5355,4.2426,0,-4.2426,4.6195,1,-1.9135,1.9135,1,-4.6195],
// 5 24 4.6195 1 -1.9135 5.5434 0 -2.2962 5 1 0 3.5355 1 -3.5355
  [5,24,4.6195,1,-1.9135,5.5434,0,-2.2962,5,1,0,3.5355,1,-3.5355],
// 
// 4 16 5 1 0 4.6195 1 1.9135 5.5434 0 2.2962 6 0 0
  [4,16,5,1,0,4.6195,1,1.9135,5.5434,0,2.2962,6,0,0],
// 4 16 4.6195 1 1.9135 3.5355 1 3.5355 4.2426 0 4.2426 5.5434 0 2.2962
  [4,16,4.6195,1,1.9135,3.5355,1,3.5355,4.2426,0,4.2426,5.5434,0,2.2962],
// 4 16 3.5355 1 3.5355 1.9135 1 4.6195 2.2962 0 5.5434 4.2426 0 4.2426
  [4,16,3.5355,1,3.5355,1.9135,1,4.6195,2.2962,0,5.5434,4.2426,0,4.2426],
// 4 16 1.9135 1 4.6195 0 1 5 0 0 6 2.2962 0 5.5434
  [4,16,1.9135,1,4.6195,0,1,5,0,0,6,2.2962,0,5.5434],
// 4 16 0 1 5 -1.9135 1 4.6195 -2.2962 0 5.5434 0 0 6
  [4,16,0,1,5,-1.9135,1,4.6195,-2.2962,0,5.5434,0,0,6],
// 4 16 -1.9135 1 4.6195 -3.5355 1 3.5355 -4.2426 0 4.2426 -2.2962 0 5.5434
  [4,16,-1.9135,1,4.6195,-3.5355,1,3.5355,-4.2426,0,4.2426,-2.2962,0,5.5434],
// 4 16 -3.5355 1 3.5355 -4.6195 1 1.9135 -5.5434 0 2.2962 -4.2426 0 4.2426
  [4,16,-3.5355,1,3.5355,-4.6195,1,1.9135,-5.5434,0,2.2962,-4.2426,0,4.2426],
// 4 16 -4.6195 1 1.9135 -5 1 0 -6 0 0 -5.5434 0 2.2962
  [4,16,-4.6195,1,1.9135,-5,1,0,-6,0,0,-5.5434,0,2.2962],
// 4 16 -5 1 0 -4.6195 1 -1.9135 -5.5434 0 -2.2962 -6 0 0
  [4,16,-5,1,0,-4.6195,1,-1.9135,-5.5434,0,-2.2962,-6,0,0],
// 4 16 -4.6195 1 -1.9135 -3.5355 1 -3.5355 -4.2426 0 -4.2426 -5.5434 0 -2.2962
  [4,16,-4.6195,1,-1.9135,-3.5355,1,-3.5355,-4.2426,0,-4.2426,-5.5434,0,-2.2962],
// 4 16 -3.5355 1 -3.5355 -1.9135 1 -4.6195 -2.2962 0 -5.5434 -4.2426 0 -4.2426
  [4,16,-3.5355,1,-3.5355,-1.9135,1,-4.6195,-2.2962,0,-5.5434,-4.2426,0,-4.2426],
// 4 16 -1.9135 1 -4.6195 0 1 -5 0 0 -6 -2.2962 0 -5.5434
  [4,16,-1.9135,1,-4.6195,0,1,-5,0,0,-6,-2.2962,0,-5.5434],
// 4 16 0 1 -5 1.9135 1 -4.6195 2.2962 0 -5.5434 0 0 -6
  [4,16,0,1,-5,1.9135,1,-4.6195,2.2962,0,-5.5434,0,0,-6],
// 4 16 1.9135 1 -4.6195 3.5355 1 -3.5355 4.2426 0 -4.2426 2.2962 0 -5.5434
  [4,16,1.9135,1,-4.6195,3.5355,1,-3.5355,4.2426,0,-4.2426,2.2962,0,-5.5434],
// 4 16 3.5355 1 -3.5355 4.6195 1 -1.9135 5.5434 0 -2.2962 4.2426 0 -4.2426
  [4,16,3.5355,1,-3.5355,4.6195,1,-1.9135,5.5434,0,-2.2962,4.2426,0,-4.2426],
// 4 16 4.6195 1 -1.9135 5 1 0 6 0 0 5.5434 0 -2.2962
  [4,16,4.6195,1,-1.9135,5,1,0,6,0,0,5.5434,0,-2.2962],
// 0
// 
];
makepoly(ldraw_lib__4_4con5(), line=0.2);
// file: ../p/4-4con3.scad
use <../lib.scad>
function ldraw_lib__4_4con3() = [
// 0 Cone  3 x 1.0
// 0 Name: 4-4con3.dat
// 0 Author: Niels Karsdorp [nielsk]
// 0 !LDRAW_ORG Primitive UPDATE 2003-02
// 0 !LICENSE Licensed under CC BY 2.0 and CC BY 4.0 : see CAreadme.txt
// 
// 0 BFC CERTIFY CCW
  [0,"BFC","CERTIFY"],
  [0,"BFC","CCW"],
// 
// 0 !HISTORY 2003-08-01 [PTadmin] Official Update 2003-02
// 0 !HISTORY 2007-06-24 [PTadmin] Header formatted for Contributor Agreement
// 0 !HISTORY 2008-07-01 [PTadmin] Official Update 2008-01
// 
// 
// 5 24 3 1 0 4 0 0 2.7717 1 1.1481 2.7717 1 -1.1481
  [5,24,3,1,0,4,0,0,2.7717,1,1.1481,2.7717,1,-1.1481],
// 5 24 2.7717 1 1.1481 3.6956 0 1.5308 2.1213 1 2.1213 3 1 0
  [5,24,2.7717,1,1.1481,3.6956,0,1.5308,2.1213,1,2.1213,3,1,0],
// 5 24 2.1213 1 2.1213 2.8284 0 2.8284 1.1481 1 2.7717 2.7717 1 1.1481
  [5,24,2.1213,1,2.1213,2.8284,0,2.8284,1.1481,1,2.7717,2.7717,1,1.1481],
// 5 24 1.1481 1 2.7717 1.5308 0 3.6956 0 1 3 2.1213 1 2.1213
  [5,24,1.1481,1,2.7717,1.5308,0,3.6956,0,1,3,2.1213,1,2.1213],
// 5 24 0 1 3 0 0 4 -1.1481 1 2.7717 1.1481 1 2.7717
  [5,24,0,1,3,0,0,4,-1.1481,1,2.7717,1.1481,1,2.7717],
// 5 24 -1.1481 1 2.7717 -1.5308 0 3.6956 -2.1213 1 2.1213 0 1 3
  [5,24,-1.1481,1,2.7717,-1.5308,0,3.6956,-2.1213,1,2.1213,0,1,3],
// 5 24 -2.1213 1 2.1213 -2.8284 0 2.8284 -2.7717 1 1.1481 -1.1481 1 2.7717
  [5,24,-2.1213,1,2.1213,-2.8284,0,2.8284,-2.7717,1,1.1481,-1.1481,1,2.7717],
// 5 24 -2.7717 1 1.1481 -3.6956 0 1.5308 -3 1 0 -2.1213 1 2.1213
  [5,24,-2.7717,1,1.1481,-3.6956,0,1.5308,-3,1,0,-2.1213,1,2.1213],
// 5 24 -3 1 0 -4 0 0 -2.7717 1 -1.1481 -2.7717 1 1.1481
  [5,24,-3,1,0,-4,0,0,-2.7717,1,-1.1481,-2.7717,1,1.1481],
// 5 24 -2.7717 1 -1.1481 -3.6956 0 -1.5308 -2.1213 1 -2.1213 -3 1 0
  [5,24,-2.7717,1,-1.1481,-3.6956,0,-1.5308,-2.1213,1,-2.1213,-3,1,0],
// 5 24 -2.1213 1 -2.1213 -2.8284 0 -2.8284 -1.1481 1 -2.7717 -2.7717 1 -1.1481
  [5,24,-2.1213,1,-2.1213,-2.8284,0,-2.8284,-1.1481,1,-2.7717,-2.7717,1,-1.1481],
// 5 24 -1.1481 1 -2.7717 -1.5308 0 -3.6956 0 1 -3 -2.1213 1 -2.1213
  [5,24,-1.1481,1,-2.7717,-1.5308,0,-3.6956,0,1,-3,-2.1213,1,-2.1213],
// 5 24 0 1 -3 0 0 -4 1.1481 1 -2.7717 -1.1481 1 -2.7717
  [5,24,0,1,-3,0,0,-4,1.1481,1,-2.7717,-1.1481,1,-2.7717],
// 5 24 1.1481 1 -2.7717 1.5308 0 -3.6956 2.1213 1 -2.1213 0 1 -3
  [5,24,1.1481,1,-2.7717,1.5308,0,-3.6956,2.1213,1,-2.1213,0,1,-3],
// 5 24 2.1213 1 -2.1213 2.8284 0 -2.8284 2.7717 1 -1.1481 1.1481 1 -2.7717
  [5,24,2.1213,1,-2.1213,2.8284,0,-2.8284,2.7717,1,-1.1481,1.1481,1,-2.7717],
// 5 24 2.7717 1 -1.1481 3.6956 0 -1.5308 3 1 0 2.1213 1 -2.1213
  [5,24,2.7717,1,-1.1481,3.6956,0,-1.5308,3,1,0,2.1213,1,-2.1213],
// 
// 4 16 3 1 0 2.7717 1 1.1481 3.6956 0 1.5308 4 0 0
  [4,16,3,1,0,2.7717,1,1.1481,3.6956,0,1.5308,4,0,0],
// 4 16 2.7717 1 1.1481 2.1213 1 2.1213 2.8284 0 2.8284 3.6956 0 1.5308
  [4,16,2.7717,1,1.1481,2.1213,1,2.1213,2.8284,0,2.8284,3.6956,0,1.5308],
// 4 16 2.1213 1 2.1213 1.1481 1 2.7717 1.5308 0 3.6956 2.8284 0 2.8284
  [4,16,2.1213,1,2.1213,1.1481,1,2.7717,1.5308,0,3.6956,2.8284,0,2.8284],
// 4 16 1.1481 1 2.7717 0 1 3 0 0 4 1.5308 0 3.6956
  [4,16,1.1481,1,2.7717,0,1,3,0,0,4,1.5308,0,3.6956],
// 4 16 0 1 3 -1.1481 1 2.7717 -1.5308 0 3.6956 0 0 4
  [4,16,0,1,3,-1.1481,1,2.7717,-1.5308,0,3.6956,0,0,4],
// 4 16 -1.1481 1 2.7717 -2.1213 1 2.1213 -2.8284 0 2.8284 -1.5308 0 3.6956
  [4,16,-1.1481,1,2.7717,-2.1213,1,2.1213,-2.8284,0,2.8284,-1.5308,0,3.6956],
// 4 16 -2.1213 1 2.1213 -2.7717 1 1.1481 -3.6956 0 1.5308 -2.8284 0 2.8284
  [4,16,-2.1213,1,2.1213,-2.7717,1,1.1481,-3.6956,0,1.5308,-2.8284,0,2.8284],
// 4 16 -2.7717 1 1.1481 -3 1 0 -4 0 0 -3.6956 0 1.5308
  [4,16,-2.7717,1,1.1481,-3,1,0,-4,0,0,-3.6956,0,1.5308],
// 4 16 -3 1 0 -2.7717 1 -1.1481 -3.6956 0 -1.5308 -4 0 0
  [4,16,-3,1,0,-2.7717,1,-1.1481,-3.6956,0,-1.5308,-4,0,0],
// 4 16 -2.7717 1 -1.1481 -2.1213 1 -2.1213 -2.8284 0 -2.8284 -3.6956 0 -1.5308
  [4,16,-2.7717,1,-1.1481,-2.1213,1,-2.1213,-2.8284,0,-2.8284,-3.6956,0,-1.5308],
// 4 16 -2.1213 1 -2.1213 -1.1481 1 -2.7717 -1.5308 0 -3.6956 -2.8284 0 -2.8284
  [4,16,-2.1213,1,-2.1213,-1.1481,1,-2.7717,-1.5308,0,-3.6956,-2.8284,0,-2.8284],
// 4 16 -1.1481 1 -2.7717 0 1 -3 0 0 -4 -1.5308 0 -3.6956
  [4,16,-1.1481,1,-2.7717,0,1,-3,0,0,-4,-1.5308,0,-3.6956],
// 4 16 0 1 -3 1.1481 1 -2.7717 1.5308 0 -3.6956 0 0 -4
  [4,16,0,1,-3,1.1481,1,-2.7717,1.5308,0,-3.6956,0,0,-4],
// 4 16 1.1481 1 -2.7717 2.1213 1 -2.1213 2.8284 0 -2.8284 1.5308 0 -3.6956
  [4,16,1.1481,1,-2.7717,2.1213,1,-2.1213,2.8284,0,-2.8284,1.5308,0,-3.6956],
// 4 16 2.1213 1 -2.1213 2.7717 1 -1.1481 3.6956 0 -1.5308 2.8284 0 -2.8284
  [4,16,2.1213,1,-2.1213,2.7717,1,-1.1481,3.6956,0,-1.5308,2.8284,0,-2.8284],
// 4 16 2.7717 1 -1.1481 3 1 0 4 0 0 3.6956 0 -1.5308
  [4,16,2.7717,1,-1.1481,3,1,0,4,0,0,3.6956,0,-1.5308],
// 
// 0
// 
];
makepoly(ldraw_lib__4_4con3(), line=0.2);
// main file
use <../lib.scad>
use <../p/4-4con3.scad>
use <../p/4-4con5.scad>
use <../p/4-4cylo.scad>
use <../p/4-4edge.scad>
use <../p/4-4ring2.scad>
use <../p/4-4ring3.scad>
use <../p/4-4ring4.scad>
function ldraw_lib__752() = [
// 0 Hose Flexible End  1 x  1 x  0.667 without Tabs
// 0 Name: 752.dat
// 0 Author: Steve Bliss [sbliss]
// 0 !LDRAW_ORG Part UPDATE 2013-01
// 0 !LICENSE Licensed under CC BY 2.0 and CC BY 4.0 : see CAreadme.txt
// 
// 0 BFC CERTIFY CW
  [0,"BFC","CERTIFY"],
  [0,"BFC","CW"],
// 
// 0 !KEYWORDS Cap, gizmo, minifig, Space, tube
// 
// 0 !HISTORY 1998-10-15 [PTadmin] Official Update 1998-09
// 0 !HISTORY 1999-07-05 [PTadmin] Official Update 1999-05
// 0 !HISTORY 2007-12-30 [PTadmin] Header formatted for Contributor Agreement
// 0 !HISTORY 2008-07-01 [PTadmin] Official Update 2008-01
// 0 !HISTORY 2013-06-02 [Steffen] BFCed, used primitives
// 0 !HISTORY 2013-07-21 [PTadmin] Official Update 2013-01
// 
// 
// 1 16 0 0 0 5 0 0 0 1 0 0 0 5 4-4edge.dat
  [1,16,0,0,0,5,0,0,0,1,0,0,0,5, ldraw_lib__4_4edge()],
// 1 16 0 0 0 1 0 0 0 1 0 0 0 1 4-4ring3.dat
  [1,16,0,0,0,1,0,0,0,1,0,0,0,1, ldraw_lib__4_4ring3()],
// 1 16 0 0 0 1 0 0 0 1 0 0 0 1 4-4ring4.dat
  [1,16,0,0,0,1,0,0,0,1,0,0,0,1, ldraw_lib__4_4ring4()],
// 1 16 0 18 0 2 0 0 0 -1 0 0 0 2 4-4ring3.dat
  [1,16,0,18,0,2,0,0,0,-1,0,0,0,2, ldraw_lib__4_4ring3()],
// 0 BFC INVERTNEXT
  [0,"BFC","INVERTNEXT"],
// 1 16 0 18 0 6 0 0 0 -8 0 0 0 6 4-4cylo.dat
  [1,16,0,18,0,6,0,0,0,-8,0,0,0,6, ldraw_lib__4_4cylo()],
// 1 16 0 10 0 2 0 0 0 -1 0 0 0 2 4-4ring2.dat
  [1,16,0,10,0,2,0,0,0,-1,0,0,0,2, ldraw_lib__4_4ring2()],
// 0 BFC INVERTNEXT
  [0,"BFC","INVERTNEXT"],
// 1 16 0 10 0 4 0 0 0 -4 0 0 0 4 4-4cylo.dat
  [1,16,0,10,0,4,0,0,0,-4,0,0,0,4, ldraw_lib__4_4cylo()],
// 1 16 0 6 0 1 0 0 0 -1 0 0 0 1 4-4ring3.dat
  [1,16,0,6,0,1,0,0,0,-1,0,0,0,1, ldraw_lib__4_4ring3()],
// 0 BFC INVERTNEXT
  [0,"BFC","INVERTNEXT"],
// 1 16 0 6 0 3 0 0 0 -6 0 0 0 3 4-4cylo.dat
  [1,16,0,6,0,3,0,0,0,-6,0,0,0,3, ldraw_lib__4_4cylo()],
// 1 16 0 18 0 8 0 0 0 -10 0 0 0 8 4-4cylo.dat
  [1,16,0,18,0,8,0,0,0,-10,0,0,0,8, ldraw_lib__4_4cylo()],
// 1 16 0 2.6667 0 1 0 0 0 -2.66667 0 0 0 -1 4-4con5.dat
  [1,16,0,2.6667,0,1,0,0,0,-2.66667,0,0,0,-1, ldraw_lib__4_4con5()],
// 1 16 0 8 0 2 0 0 0 -5.33333 0 0 0 -2 4-4con3.dat
  [1,16,0,8,0,2,0,0,0,-5.33333,0,0,0,-2, ldraw_lib__4_4con3()],
];
makepoly(ldraw_lib__752(), line=0.2);
